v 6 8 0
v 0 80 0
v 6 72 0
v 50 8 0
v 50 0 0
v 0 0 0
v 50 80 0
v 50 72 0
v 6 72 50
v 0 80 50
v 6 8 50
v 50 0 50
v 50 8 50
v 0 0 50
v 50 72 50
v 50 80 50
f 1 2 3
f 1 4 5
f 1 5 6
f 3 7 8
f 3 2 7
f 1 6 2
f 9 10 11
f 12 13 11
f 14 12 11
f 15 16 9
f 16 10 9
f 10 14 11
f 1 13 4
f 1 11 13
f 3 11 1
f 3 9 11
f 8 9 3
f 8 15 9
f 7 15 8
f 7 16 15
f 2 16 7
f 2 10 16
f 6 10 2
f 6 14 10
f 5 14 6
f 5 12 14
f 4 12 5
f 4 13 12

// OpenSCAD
$fn = 32;

// ----------------------------------------------------------------------
// Structural section: channel 50 x 80 mm
// ----------------------------------------------------------------------

// --- parameters (mm) ---
sec_w = 50;               // channel width, X
sec_h = 80;               // channel height, Y
flange_t = 8;             // flange thickness
web_t = 6;                // web thickness
plate_t = 50;             // cut length, Z (extrusion height)

profile = [[0, 0], [50, 0], [50, 8], [6, 8], [6, 72], [50, 72], [50, 80], [0, 80]];  // primary outline, 8 points, counter clockwise

// --- the one profile operation ---
linear_extrude(height = plate_t) polygon(points = profile);
